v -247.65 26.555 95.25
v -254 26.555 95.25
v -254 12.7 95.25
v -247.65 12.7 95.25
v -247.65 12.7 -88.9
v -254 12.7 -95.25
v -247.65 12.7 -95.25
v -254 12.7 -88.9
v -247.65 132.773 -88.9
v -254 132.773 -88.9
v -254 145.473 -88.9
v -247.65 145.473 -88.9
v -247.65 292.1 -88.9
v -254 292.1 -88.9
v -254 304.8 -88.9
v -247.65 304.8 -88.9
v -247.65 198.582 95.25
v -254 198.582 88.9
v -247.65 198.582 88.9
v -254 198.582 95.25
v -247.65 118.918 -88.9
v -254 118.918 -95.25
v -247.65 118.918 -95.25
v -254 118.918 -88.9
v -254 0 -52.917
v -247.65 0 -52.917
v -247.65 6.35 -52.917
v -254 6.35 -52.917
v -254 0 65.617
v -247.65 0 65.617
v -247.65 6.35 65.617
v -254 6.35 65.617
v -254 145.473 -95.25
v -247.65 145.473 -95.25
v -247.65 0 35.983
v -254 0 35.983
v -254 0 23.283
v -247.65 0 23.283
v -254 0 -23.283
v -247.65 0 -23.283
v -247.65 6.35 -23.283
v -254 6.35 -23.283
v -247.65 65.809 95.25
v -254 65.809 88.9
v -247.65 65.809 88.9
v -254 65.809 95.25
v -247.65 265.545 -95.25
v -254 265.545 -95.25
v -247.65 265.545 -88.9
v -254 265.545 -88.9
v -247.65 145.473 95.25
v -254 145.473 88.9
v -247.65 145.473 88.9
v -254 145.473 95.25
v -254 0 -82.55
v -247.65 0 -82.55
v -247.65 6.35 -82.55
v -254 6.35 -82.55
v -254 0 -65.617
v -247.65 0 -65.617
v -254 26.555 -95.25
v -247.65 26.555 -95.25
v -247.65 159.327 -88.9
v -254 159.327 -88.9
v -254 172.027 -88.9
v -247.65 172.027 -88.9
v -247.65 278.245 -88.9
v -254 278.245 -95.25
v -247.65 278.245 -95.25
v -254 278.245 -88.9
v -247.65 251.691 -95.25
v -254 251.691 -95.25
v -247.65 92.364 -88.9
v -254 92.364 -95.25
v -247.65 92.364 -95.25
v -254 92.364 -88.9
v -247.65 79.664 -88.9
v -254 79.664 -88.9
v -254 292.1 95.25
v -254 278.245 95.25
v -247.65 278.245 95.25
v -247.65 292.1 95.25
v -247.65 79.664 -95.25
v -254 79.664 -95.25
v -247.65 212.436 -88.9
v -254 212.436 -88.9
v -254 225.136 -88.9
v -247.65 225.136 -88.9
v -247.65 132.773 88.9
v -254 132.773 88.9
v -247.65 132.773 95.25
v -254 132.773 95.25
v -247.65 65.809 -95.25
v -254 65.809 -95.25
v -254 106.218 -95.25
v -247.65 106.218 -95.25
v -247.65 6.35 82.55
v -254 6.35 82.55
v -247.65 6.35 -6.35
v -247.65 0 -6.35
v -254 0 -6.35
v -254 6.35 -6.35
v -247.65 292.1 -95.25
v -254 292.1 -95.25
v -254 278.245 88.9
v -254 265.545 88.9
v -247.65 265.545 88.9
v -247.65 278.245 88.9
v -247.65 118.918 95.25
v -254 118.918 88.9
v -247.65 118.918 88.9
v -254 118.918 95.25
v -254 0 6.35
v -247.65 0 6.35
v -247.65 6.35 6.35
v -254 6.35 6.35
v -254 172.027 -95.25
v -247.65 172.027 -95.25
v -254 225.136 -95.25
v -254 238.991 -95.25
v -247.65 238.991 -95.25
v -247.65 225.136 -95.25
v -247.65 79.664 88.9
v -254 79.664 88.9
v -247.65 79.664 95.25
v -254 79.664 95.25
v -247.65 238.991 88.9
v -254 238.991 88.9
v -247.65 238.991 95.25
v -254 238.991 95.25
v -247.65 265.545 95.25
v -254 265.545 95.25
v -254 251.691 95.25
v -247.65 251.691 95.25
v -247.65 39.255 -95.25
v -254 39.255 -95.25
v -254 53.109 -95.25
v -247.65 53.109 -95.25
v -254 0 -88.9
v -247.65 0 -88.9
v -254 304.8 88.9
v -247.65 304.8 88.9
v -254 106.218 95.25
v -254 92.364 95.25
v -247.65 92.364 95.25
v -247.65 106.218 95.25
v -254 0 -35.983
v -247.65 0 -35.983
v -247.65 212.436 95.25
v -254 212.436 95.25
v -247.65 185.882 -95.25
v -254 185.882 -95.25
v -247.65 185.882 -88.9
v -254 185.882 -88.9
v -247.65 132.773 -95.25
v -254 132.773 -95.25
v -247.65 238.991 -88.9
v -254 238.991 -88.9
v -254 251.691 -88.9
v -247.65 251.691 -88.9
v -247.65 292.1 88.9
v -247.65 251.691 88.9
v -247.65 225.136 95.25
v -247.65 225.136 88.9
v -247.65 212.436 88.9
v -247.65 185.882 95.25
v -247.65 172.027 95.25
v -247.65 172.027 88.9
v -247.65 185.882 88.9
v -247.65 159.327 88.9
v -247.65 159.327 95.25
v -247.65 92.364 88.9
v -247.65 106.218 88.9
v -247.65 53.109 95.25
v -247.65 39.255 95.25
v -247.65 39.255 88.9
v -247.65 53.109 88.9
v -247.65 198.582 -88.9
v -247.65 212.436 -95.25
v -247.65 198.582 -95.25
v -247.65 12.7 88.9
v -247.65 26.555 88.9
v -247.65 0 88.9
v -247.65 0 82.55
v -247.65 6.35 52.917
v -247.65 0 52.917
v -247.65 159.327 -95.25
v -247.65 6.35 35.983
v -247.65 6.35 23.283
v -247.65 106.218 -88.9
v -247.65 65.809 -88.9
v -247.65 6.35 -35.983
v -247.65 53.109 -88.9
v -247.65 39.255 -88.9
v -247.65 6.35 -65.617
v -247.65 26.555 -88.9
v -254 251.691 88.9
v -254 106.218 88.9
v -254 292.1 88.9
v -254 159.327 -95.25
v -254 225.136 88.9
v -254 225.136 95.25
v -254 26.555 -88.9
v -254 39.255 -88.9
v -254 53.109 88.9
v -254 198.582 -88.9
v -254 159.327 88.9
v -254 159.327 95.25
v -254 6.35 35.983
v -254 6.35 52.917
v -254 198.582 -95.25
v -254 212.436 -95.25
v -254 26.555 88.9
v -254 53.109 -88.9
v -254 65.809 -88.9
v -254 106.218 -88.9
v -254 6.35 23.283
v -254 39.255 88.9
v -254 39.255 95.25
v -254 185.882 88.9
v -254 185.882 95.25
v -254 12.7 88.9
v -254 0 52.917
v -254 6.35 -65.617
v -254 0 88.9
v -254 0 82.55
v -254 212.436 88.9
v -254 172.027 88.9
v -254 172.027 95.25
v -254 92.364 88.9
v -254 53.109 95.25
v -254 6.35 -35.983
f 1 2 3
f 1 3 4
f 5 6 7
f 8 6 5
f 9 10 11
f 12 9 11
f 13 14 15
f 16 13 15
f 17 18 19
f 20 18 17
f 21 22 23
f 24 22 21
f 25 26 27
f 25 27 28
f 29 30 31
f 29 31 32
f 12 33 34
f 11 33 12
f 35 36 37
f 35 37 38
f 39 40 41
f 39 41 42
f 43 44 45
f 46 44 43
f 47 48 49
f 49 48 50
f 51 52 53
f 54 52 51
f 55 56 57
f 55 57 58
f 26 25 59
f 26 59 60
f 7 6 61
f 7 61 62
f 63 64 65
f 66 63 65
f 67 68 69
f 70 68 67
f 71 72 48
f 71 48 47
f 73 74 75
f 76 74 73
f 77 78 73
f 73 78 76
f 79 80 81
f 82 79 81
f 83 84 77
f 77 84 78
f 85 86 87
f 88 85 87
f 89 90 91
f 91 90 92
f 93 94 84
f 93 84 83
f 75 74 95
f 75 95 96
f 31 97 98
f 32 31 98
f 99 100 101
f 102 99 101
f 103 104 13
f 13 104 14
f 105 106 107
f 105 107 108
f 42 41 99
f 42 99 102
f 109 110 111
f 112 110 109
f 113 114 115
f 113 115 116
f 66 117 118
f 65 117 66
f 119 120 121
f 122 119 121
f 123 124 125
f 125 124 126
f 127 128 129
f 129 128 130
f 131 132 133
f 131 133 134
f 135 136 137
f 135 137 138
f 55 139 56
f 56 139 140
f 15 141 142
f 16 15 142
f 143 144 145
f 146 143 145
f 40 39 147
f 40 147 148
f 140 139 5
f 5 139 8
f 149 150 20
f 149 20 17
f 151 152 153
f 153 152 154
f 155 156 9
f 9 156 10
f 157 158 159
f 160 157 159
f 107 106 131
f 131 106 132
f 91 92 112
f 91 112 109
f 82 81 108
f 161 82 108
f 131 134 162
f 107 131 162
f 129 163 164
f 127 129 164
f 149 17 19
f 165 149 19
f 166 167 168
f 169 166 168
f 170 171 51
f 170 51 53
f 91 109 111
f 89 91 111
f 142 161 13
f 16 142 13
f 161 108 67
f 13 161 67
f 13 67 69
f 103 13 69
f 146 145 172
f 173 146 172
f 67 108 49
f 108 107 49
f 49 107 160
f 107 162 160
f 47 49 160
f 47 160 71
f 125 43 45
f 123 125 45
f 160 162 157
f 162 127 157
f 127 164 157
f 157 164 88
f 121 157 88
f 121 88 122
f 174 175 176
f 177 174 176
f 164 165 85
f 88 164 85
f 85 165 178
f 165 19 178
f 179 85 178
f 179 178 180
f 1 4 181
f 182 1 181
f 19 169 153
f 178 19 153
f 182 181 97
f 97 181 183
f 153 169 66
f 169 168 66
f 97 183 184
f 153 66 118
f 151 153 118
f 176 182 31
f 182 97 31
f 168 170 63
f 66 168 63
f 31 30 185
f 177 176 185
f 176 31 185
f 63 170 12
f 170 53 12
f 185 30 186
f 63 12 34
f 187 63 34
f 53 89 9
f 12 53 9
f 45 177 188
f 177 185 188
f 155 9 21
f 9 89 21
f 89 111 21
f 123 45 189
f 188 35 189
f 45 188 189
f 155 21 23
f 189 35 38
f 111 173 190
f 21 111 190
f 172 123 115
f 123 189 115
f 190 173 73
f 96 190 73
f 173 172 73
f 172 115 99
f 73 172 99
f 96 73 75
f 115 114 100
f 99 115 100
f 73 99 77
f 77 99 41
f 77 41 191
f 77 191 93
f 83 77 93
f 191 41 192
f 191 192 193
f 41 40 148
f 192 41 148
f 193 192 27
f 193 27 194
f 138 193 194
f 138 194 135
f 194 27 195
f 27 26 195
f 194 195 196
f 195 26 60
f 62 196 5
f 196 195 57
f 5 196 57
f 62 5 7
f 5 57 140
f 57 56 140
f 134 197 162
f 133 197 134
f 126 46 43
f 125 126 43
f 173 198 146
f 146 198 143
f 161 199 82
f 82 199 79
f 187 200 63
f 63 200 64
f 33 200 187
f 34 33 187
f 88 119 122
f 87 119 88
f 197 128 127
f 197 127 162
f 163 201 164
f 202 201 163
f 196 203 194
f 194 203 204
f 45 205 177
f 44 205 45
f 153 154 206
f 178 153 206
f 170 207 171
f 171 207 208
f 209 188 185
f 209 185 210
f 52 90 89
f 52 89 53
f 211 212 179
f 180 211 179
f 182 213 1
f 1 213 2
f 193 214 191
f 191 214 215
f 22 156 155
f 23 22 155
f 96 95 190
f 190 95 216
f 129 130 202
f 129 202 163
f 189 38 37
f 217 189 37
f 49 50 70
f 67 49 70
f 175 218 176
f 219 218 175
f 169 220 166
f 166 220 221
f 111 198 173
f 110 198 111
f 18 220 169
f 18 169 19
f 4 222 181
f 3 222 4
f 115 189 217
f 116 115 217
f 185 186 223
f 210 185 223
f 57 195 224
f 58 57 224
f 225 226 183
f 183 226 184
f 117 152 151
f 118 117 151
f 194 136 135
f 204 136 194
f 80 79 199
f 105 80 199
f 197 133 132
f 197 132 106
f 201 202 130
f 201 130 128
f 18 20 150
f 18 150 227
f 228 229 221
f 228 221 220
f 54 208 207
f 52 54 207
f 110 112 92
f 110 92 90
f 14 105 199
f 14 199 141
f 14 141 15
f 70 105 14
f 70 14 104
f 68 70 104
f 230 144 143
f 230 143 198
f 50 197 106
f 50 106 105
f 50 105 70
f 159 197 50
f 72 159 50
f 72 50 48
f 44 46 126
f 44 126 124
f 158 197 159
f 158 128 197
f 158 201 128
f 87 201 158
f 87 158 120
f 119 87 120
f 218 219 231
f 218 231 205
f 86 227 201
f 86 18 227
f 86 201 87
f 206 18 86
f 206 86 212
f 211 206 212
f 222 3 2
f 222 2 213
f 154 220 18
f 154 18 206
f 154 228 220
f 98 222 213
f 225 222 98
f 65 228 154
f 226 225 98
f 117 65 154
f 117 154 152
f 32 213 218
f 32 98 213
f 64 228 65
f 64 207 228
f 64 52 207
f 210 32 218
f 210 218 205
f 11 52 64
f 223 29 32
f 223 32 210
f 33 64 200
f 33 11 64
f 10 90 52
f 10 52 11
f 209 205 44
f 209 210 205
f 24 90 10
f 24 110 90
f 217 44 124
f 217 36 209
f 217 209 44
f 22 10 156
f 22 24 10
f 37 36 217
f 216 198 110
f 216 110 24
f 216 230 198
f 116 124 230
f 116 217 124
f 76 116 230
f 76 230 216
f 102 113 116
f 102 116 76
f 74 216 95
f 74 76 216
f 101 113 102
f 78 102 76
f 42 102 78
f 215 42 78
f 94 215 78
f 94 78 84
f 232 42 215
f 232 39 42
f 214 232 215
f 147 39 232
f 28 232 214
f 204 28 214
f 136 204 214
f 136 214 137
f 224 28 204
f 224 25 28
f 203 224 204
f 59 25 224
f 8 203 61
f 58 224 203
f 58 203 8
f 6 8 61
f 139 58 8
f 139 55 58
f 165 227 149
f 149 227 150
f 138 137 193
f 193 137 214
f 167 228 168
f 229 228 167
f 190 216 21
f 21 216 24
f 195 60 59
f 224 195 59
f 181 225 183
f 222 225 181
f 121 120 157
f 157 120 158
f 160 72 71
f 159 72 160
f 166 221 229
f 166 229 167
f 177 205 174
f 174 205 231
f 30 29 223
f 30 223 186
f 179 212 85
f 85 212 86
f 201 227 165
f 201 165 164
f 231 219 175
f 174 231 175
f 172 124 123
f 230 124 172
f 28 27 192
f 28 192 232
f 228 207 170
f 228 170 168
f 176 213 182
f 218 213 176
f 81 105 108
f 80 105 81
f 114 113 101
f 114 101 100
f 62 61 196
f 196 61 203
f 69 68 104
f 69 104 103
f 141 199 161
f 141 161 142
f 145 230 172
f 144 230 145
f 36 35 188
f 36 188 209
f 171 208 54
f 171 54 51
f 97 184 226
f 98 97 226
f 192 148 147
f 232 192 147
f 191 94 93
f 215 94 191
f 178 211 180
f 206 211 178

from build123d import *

# Parameters (mm, degrees)
SKETCH1_W           = 508
SKETCH1_H           = 190.5
BOSS_EXTRUDE1_DEPTH = 6.35
SKETCH2_W           = 508
SKETCH2_H           = 190.5
SKETCH2_W_2         = 495.3
SKETCH2_H_2         = 177.8
BOSS_EXTRUDE2_DEPTH = 298.45
SKETCH3_W           = 6.35
SKETCH3_H           = 16.933333333
SKETCH3_H_2         = 16.933333334
CUT_EXTRUDE1_DEPTH  = 12.7
SKETCH4_W           = 6.35
SKETCH4_H           = 15.875
CUT_EXTRUDE2_DEPTH  = 6.35
SKETCH6_W           = 514.801062296
SKETCH6_H           = 254.881465808
CUT_EXTRUDE5_DEPTH  = 305.8
SKETCH5_W           = 6.35
SKETCH5_H           = 16.933333333
SKETCH5_H_2         = 16.933333334
CUT_EXTRUDE6_DEPTH  = 6.35
SKETCH7_W           = 6.35
SKETCH7_H           = 12.7
CUT_EXTRUDE7_DEPTH  = 7.35


with BuildPart() as part:
    # Sketch1 → Boss-Extrude1 (new body)
    with BuildSketch(Plane(origin=(0, 0, 0), x_dir=(1, 0, 0), z_dir=(0, 1, 0))):
        Rectangle(SKETCH1_W, SKETCH1_H)
    extrude(amount=BOSS_EXTRUDE1_DEPTH)

    # Sketch2 → Boss-Extrude2 (add)
    with BuildSketch(Plane(origin=(0, 6.35, 0), x_dir=(1, 0, 0), z_dir=(0, 1, 0))):
        Rectangle(SKETCH2_W, SKETCH2_H)
        Rectangle(SKETCH2_W_2, SKETCH2_H_2, mode=Mode.SUBTRACT)
    extrude(amount=BOSS_EXTRUDE2_DEPTH)

    # Sketch3 → Cut-Extrude1 (cut)
    with BuildSketch(Plane.XY.offset(95.25)):
        with BuildLine():
            Line((-3.302, 283.21), (-3.302, 6.35))
            Line((-3.302, 6.35), (3.302, 6.35))
            Line((3.302, 6.35), (3.302, 292.354))
            Line((3.302, 292.354), (-16.256, 292.354))
            Line((-16.256, 292.354), (-16.256, 285.75))
            Line((-16.256, 285.75), (-5.842, 285.75))
            ThreePointArc((-5.842, 285.75), (-4.045948776, 285.006051224), (-3.302, 283.21))
        make_face()
        with Locations((12.827, 80.433333334)):
            Rectangle(SKETCH3_W, SKETCH3_H)
        with Locations((12.827, 50.8)):
            Rectangle(SKETCH3_W, SKETCH3_H_2)
        with Locations((12.827, 21.166666667)):
            Rectangle(SKETCH3_W, SKETCH3_H)
    extrude(amount=-CUT_EXTRUDE1_DEPTH, mode=Mode.SUBTRACT)

    # Sketch4 → Cut-Extrude2 (cut)
    with BuildSketch(Plane.XY.offset(-88.9)):
        with Locations((-19.431, 284.1625)):
            Rectangle(SKETCH4_W, SKETCH4_H)
        with Locations((-19.431, 255.5875)):
            Rectangle(SKETCH4_W, SKETCH4_H)
        with Locations((-19.431, 227.0125)):
            Rectangle(SKETCH4_W, SKETCH4_H)
        with Locations((-19.431, 198.4375)):
            Rectangle(SKETCH4_W, SKETCH4_H)
        with Locations((-19.431, 169.8625)):
            Rectangle(SKETCH4_W, SKETCH4_H)
        with Locations((-19.431, 141.2875)):
            Rectangle(SKETCH4_W, SKETCH4_H)
        with Locations((-19.431, 112.7125)):
            Rectangle(SKETCH4_W, SKETCH4_H)
        with Locations((-19.431, 84.1375)):
            Rectangle(SKETCH4_W, SKETCH4_H)
        with Locations((-19.431, 55.5625)):
            Rectangle(SKETCH4_W, SKETCH4_H)
        with Locations((-19.431, 26.9875)):
            Rectangle(SKETCH4_W, SKETCH4_H)
    cut_extrude2 = extrude(amount=-CUT_EXTRUDE2_DEPTH, mode=Mode.SUBTRACT)

    # Mirror1: Cut-Extrude2 across plane
    add(cut_extrude2.mirror(Plane.ZY.offset(6.477)), mode=Mode.SUBTRACT)

    # Sketch6 → Cut-Extrude5 (cut, through all)
    with BuildSketch(Plane(origin=(0, 0, 0), x_dir=(1, 0, 0), z_dir=(0, 1, 0))):
        with Locations((9.750531148, -10.000845247)):
            Rectangle(SKETCH6_W, SKETCH6_H)
    extrude(amount=CUT_EXTRUDE5_DEPTH, mode=Mode.SUBTRACT)

    # Sketch5 → Cut-Extrude6 (cut)
    with BuildSketch(Plane(origin=(0, 0, 0), x_dir=(-1, 0, 0), z_dir=(0, -1, 0))):
        with Locations((250.825, -74.083333334)):
            Rectangle(SKETCH5_W, SKETCH5_H)
        with Locations((250.825, -44.45)):
            Rectangle(SKETCH5_W, SKETCH5_H_2)
        with Locations((250.825, -14.816666667)):
            Rectangle(SKETCH5_W, SKETCH5_H)
        with Locations((250.825, 14.816666667)):
            Rectangle(SKETCH5_W, SKETCH5_H)
        with Locations((250.825, 44.45)):
            Rectangle(SKETCH5_W, SKETCH5_H_2)
        with Locations((250.825, 74.083333334)):
            Rectangle(SKETCH5_W, SKETCH5_H)
    extrude(amount=-CUT_EXTRUDE6_DEPTH, mode=Mode.SUBTRACT)

    # Sketch7 → Cut-Extrude7 (cut, through all)
    with BuildSketch(Plane.ZY.offset(254)):
        with Locations((-92.075, 32.904545455)):
            Rectangle(SKETCH7_W, SKETCH7_H)
        with Locations((-92.075, 6.35)):
            Rectangle(SKETCH7_W, SKETCH7_H)
        with Locations((-92.075, 59.459090909)):
            Rectangle(SKETCH7_W, SKETCH7_H)
        with Locations((-92.075, 86.013636364)):
            Rectangle(SKETCH7_W, SKETCH7_H)
        with Locations((-92.075, 112.568181818)):
            Rectangle(SKETCH7_W, SKETCH7_H)
        with Locations((-92.075, 139.122727273)):
            Rectangle(SKETCH7_W, SKETCH7_H)
        with Locations((-92.075, 165.677272727)):
            Rectangle(SKETCH7_W, SKETCH7_H)
        with Locations((-92.075, 192.231818182)):
            Rectangle(SKETCH7_W, SKETCH7_H)
        with Locations((-92.075, 218.786363636)):
            Rectangle(SKETCH7_W, SKETCH7_H)
        with Locations((-92.075, 245.340909091)):
            Rectangle(SKETCH7_W, SKETCH7_H)
        with Locations((-92.075, 271.895454545)):
            Rectangle(SKETCH7_W, SKETCH7_H)
        with Locations((-92.075, 298.45)):
            Rectangle(SKETCH7_W, SKETCH7_H)
        with Locations((92.075, 298.45)):
            Rectangle(SKETCH7_W, SKETCH7_H)
        with Locations((92.075, 271.895454545)):
            Rectangle(SKETCH7_W, SKETCH7_H)
        with Locations((92.075, 245.340909091)):
            Rectangle(SKETCH7_W, SKETCH7_H)
        with Locations((92.075, 218.786363636)):
            Rectangle(SKETCH7_W, SKETCH7_H)
        with Locations((92.075, 192.231818182)):
            Rectangle(SKETCH7_W, SKETCH7_H)
        with Locations((92.075, 165.677272727)):
            Rectangle(SKETCH7_W, SKETCH7_H)
        with Locations((92.075, 139.122727273)):
            Rectangle(SKETCH7_W, SKETCH7_H)
        with Locations((92.075, 112.568181818)):
            Rectangle(SKETCH7_W, SKETCH7_H)
        with Locations((92.075, 86.013636364)):
            Rectangle(SKETCH7_W, SKETCH7_H)
        with Locations((92.075, 59.459090909)):
            Rectangle(SKETCH7_W, SKETCH7_H)
        with Locations((92.075, 32.904545455)):
            Rectangle(SKETCH7_W, SKETCH7_H)
        with Locations((92.075, 6.35)):
            Rectangle(SKETCH7_W, SKETCH7_H)
    extrude(amount=-CUT_EXTRUDE7_DEPTH, mode=Mode.SUBTRACT)


solid = part.part
